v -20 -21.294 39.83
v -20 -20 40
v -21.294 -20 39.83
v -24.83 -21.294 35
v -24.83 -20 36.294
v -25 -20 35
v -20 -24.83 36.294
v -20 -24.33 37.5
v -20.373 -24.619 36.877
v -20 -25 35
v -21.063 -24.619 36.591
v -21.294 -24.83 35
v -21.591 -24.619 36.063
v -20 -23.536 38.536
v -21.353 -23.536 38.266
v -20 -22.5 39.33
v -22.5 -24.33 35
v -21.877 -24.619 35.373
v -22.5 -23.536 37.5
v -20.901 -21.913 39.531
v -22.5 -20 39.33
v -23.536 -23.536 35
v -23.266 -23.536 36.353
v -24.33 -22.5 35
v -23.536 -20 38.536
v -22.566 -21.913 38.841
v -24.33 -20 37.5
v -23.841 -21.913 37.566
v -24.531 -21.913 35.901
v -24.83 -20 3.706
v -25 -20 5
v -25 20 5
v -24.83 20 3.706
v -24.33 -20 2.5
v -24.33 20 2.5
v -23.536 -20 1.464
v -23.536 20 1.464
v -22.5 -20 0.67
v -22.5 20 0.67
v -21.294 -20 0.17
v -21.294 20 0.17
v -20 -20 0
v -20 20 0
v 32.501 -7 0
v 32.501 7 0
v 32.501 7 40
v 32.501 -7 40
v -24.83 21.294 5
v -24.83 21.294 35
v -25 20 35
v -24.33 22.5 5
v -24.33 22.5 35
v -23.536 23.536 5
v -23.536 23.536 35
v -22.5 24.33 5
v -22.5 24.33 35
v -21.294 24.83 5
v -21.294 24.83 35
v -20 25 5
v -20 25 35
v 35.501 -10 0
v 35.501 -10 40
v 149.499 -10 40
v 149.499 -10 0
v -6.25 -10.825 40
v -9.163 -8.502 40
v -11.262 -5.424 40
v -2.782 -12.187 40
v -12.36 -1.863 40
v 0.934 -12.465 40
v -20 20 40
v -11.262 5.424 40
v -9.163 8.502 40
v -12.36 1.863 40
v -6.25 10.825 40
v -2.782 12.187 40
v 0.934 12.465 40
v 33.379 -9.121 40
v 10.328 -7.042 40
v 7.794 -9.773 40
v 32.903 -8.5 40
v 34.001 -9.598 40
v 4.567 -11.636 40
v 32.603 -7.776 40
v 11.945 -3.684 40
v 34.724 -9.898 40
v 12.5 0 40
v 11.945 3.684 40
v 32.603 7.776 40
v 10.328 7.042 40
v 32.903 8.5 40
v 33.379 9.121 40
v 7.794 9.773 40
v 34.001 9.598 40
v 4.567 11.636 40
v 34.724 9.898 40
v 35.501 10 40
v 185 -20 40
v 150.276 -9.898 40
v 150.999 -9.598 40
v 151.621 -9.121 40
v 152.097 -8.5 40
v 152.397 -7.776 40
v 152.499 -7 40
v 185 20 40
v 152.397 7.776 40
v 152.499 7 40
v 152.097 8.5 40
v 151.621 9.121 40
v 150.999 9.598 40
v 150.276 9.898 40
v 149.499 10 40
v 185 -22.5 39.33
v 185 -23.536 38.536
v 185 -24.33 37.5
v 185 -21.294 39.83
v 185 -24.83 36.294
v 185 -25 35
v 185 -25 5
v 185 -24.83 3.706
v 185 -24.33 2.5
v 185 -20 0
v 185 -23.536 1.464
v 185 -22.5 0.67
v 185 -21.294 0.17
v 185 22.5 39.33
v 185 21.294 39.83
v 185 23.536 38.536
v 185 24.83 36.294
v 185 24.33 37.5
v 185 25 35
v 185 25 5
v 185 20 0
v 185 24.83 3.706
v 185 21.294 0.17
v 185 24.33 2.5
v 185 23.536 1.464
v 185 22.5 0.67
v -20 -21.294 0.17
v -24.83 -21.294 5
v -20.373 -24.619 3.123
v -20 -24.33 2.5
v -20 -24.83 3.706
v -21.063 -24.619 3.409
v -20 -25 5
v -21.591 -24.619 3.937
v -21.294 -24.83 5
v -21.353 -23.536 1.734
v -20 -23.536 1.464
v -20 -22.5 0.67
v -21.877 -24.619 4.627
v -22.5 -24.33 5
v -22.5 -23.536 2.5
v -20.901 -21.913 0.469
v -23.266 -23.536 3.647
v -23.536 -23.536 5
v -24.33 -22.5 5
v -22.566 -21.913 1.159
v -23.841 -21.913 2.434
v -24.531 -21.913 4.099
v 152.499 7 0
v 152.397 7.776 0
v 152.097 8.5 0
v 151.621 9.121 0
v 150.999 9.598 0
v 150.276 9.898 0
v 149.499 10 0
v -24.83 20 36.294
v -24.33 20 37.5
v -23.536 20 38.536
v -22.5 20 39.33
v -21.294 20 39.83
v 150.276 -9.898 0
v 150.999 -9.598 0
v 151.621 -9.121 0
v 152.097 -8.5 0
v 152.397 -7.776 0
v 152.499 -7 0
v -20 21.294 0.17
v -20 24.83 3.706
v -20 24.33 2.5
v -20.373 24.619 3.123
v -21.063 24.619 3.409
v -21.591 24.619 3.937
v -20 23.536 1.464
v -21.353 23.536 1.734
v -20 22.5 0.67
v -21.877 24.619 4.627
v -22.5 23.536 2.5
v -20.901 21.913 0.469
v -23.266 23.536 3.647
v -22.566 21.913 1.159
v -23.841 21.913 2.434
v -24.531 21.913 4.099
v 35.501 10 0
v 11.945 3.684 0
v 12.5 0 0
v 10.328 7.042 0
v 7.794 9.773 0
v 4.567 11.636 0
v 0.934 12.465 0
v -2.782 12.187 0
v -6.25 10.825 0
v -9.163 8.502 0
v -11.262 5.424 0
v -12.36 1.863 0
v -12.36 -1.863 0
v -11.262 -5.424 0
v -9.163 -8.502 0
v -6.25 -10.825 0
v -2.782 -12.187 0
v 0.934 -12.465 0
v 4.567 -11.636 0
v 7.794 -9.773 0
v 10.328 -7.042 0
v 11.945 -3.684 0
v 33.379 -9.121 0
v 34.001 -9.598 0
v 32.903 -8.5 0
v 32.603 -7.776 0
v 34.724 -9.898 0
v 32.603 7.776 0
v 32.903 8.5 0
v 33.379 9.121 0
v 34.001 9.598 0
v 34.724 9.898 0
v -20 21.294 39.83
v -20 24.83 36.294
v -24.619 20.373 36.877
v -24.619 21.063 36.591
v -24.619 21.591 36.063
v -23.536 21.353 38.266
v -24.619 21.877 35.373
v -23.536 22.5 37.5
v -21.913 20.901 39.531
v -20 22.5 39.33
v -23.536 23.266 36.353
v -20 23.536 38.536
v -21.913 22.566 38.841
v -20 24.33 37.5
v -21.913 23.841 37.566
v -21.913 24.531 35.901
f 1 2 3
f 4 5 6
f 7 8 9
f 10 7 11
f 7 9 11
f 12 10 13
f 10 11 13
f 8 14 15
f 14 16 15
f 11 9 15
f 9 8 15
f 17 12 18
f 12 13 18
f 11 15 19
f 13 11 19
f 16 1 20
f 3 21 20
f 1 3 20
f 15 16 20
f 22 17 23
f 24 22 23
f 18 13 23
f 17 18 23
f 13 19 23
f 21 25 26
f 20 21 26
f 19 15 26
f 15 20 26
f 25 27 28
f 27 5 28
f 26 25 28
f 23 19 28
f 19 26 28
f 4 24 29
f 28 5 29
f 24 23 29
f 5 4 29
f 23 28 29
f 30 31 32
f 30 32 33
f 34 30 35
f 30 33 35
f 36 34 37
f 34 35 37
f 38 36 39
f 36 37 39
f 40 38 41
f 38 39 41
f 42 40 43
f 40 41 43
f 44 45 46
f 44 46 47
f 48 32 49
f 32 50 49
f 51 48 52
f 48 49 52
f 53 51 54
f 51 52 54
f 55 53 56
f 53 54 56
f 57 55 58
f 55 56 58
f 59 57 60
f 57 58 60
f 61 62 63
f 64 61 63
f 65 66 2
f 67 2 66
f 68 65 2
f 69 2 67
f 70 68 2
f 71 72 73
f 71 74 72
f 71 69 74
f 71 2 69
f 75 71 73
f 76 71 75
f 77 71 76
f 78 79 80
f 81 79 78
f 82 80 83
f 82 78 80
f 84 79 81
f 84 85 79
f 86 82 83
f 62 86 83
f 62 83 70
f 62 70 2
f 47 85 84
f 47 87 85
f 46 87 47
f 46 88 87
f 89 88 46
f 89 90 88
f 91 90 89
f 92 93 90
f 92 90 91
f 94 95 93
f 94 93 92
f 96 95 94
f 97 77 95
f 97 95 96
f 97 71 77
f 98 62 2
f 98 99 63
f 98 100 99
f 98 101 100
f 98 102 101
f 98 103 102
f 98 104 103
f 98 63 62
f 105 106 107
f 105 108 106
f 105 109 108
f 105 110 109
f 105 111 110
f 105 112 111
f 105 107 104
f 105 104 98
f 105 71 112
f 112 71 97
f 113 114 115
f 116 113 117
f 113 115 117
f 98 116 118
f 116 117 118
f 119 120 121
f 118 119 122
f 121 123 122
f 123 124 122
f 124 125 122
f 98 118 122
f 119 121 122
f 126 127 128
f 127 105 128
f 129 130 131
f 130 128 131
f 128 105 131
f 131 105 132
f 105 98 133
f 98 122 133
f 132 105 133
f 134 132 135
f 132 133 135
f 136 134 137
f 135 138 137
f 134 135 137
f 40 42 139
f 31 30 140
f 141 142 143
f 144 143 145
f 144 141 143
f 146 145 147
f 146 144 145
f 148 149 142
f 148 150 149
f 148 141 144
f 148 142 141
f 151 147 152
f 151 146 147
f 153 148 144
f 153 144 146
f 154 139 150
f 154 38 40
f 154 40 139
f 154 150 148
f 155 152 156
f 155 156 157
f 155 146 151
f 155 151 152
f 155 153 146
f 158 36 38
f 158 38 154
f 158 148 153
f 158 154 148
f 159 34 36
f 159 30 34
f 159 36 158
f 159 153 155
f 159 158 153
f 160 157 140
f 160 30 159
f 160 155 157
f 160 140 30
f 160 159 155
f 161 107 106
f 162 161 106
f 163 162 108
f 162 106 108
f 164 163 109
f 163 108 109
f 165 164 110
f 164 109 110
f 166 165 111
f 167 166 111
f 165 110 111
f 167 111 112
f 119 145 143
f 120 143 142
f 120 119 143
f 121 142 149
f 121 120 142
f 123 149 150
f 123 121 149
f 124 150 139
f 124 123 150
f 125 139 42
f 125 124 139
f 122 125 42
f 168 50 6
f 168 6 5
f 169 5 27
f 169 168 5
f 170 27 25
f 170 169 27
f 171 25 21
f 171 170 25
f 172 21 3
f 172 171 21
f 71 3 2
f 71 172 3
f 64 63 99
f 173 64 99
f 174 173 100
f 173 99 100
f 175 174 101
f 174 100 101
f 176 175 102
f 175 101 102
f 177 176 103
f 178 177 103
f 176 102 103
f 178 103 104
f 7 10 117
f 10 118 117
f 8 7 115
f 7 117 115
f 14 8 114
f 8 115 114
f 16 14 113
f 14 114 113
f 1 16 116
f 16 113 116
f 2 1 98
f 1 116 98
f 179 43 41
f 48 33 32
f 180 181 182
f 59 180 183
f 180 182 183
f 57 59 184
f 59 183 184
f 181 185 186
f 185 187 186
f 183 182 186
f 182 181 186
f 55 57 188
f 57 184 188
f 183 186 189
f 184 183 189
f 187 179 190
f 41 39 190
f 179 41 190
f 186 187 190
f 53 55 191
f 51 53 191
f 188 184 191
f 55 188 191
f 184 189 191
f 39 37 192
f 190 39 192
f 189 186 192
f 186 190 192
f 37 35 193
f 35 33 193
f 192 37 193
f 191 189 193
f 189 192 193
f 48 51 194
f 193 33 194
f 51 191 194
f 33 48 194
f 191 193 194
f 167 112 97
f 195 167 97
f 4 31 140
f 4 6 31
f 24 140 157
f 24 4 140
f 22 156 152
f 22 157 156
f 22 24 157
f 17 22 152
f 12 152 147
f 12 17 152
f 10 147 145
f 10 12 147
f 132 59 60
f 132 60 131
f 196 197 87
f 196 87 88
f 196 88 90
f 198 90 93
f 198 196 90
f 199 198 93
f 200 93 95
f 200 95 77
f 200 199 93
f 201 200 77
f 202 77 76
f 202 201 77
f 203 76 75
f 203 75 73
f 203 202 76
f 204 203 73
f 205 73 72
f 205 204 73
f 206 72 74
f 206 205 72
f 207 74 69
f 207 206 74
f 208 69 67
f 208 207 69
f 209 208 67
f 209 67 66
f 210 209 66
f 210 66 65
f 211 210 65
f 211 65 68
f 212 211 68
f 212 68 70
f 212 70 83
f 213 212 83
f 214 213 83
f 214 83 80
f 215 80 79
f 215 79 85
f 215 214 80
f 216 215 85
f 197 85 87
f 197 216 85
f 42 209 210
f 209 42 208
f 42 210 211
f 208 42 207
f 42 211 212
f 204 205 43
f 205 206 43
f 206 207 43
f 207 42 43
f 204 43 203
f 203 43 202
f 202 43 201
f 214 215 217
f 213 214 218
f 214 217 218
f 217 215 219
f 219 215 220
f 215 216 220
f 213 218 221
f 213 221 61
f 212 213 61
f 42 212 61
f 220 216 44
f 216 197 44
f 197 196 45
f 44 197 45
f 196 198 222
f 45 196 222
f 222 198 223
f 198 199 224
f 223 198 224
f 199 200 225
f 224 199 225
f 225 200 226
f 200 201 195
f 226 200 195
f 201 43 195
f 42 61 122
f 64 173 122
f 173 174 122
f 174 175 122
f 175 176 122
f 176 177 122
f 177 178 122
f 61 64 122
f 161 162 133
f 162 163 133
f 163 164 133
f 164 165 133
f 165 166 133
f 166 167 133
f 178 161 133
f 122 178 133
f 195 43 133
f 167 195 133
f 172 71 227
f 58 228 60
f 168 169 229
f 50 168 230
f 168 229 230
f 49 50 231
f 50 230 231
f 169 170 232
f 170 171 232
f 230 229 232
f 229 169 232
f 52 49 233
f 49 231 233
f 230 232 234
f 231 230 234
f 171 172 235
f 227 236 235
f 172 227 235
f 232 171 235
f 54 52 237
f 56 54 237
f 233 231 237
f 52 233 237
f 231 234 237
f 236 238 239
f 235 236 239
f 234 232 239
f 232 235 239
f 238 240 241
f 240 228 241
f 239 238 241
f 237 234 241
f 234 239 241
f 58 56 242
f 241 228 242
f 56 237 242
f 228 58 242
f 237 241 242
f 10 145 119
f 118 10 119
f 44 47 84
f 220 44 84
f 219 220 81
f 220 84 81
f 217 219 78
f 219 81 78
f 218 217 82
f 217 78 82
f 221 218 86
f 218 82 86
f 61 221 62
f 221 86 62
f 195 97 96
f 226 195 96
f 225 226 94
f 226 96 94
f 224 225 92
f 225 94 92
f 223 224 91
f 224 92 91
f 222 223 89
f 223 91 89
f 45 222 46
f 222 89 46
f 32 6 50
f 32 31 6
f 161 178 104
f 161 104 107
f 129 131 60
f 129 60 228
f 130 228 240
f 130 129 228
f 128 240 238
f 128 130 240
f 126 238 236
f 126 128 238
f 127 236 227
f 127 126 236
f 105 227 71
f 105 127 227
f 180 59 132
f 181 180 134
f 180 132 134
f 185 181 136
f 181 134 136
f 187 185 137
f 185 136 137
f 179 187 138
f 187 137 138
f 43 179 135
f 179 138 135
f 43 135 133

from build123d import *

# Parameters (mm, degrees)
CROQUIS1_W              = 210
CROQUIS1_H              = 50
CROQUIS1_R              = 12.5
SALIENTE_EXTRUIR1_DEPTH = 40
REDONDEO1_R             = 5
CORTAR_EXTRUIR1_DEPTH   = 191.91883092


with BuildPart() as part:
    # Croquis1 → Saliente-Extruir1 (new body)
    with BuildSketch(Plane.XY):
        with Locations((80, 0)):
            Rectangle(CROQUIS1_W, CROQUIS1_H)
        Circle(CROQUIS1_R, mode=Mode.SUBTRACT)
    extrude(amount=SALIENTE_EXTRUIR1_DEPTH)

    # Redondeo1
    redondeo1_edges = [part.edges().sort_by_distance(p)[0] for p in [
        (80, 25, 40),
        (-25, 0, 40),
        (80, -25, 40),
        (-25, 0, 0),
        (80, 25, 0),
        (80, -25, 0),
        (-25, -25, 20),
        (-25, 25, 20),
    ]]
    fillet(redondeo1_edges, radius=REDONDEO1_R)

    # Croquis2 → Cortar-Extruir1 (cut, through all)
    with BuildSketch(Plane.XY.offset(40)):
        with BuildLine():
            Line((149.499217678, 10), (35.500782322, 10))
            ThreePointArc((35.500782322, 10), (33.379461979, 9.121320344), (32.500782322, 7))
            Line((32.500782322, 7), (32.500782322, -7))
            ThreePointArc((32.500782322, -7), (33.379461979, -9.121320344), (35.500782322, -10))
            Line((35.500782322, -10), (149.499217678, -10))
            ThreePointArc((149.499217678, -10), (151.620538021, -9.121320344), (152.499217678, -7))
            Line((152.499217678, -7), (152.499217678, 7))
            ThreePointArc((152.499217678, 7), (151.620538021, 9.121320344), (149.499217678, 10))
        make_face()
    extrude(amount=-CORTAR_EXTRUIR1_DEPTH, mode=Mode.SUBTRACT)


solid = part.part
